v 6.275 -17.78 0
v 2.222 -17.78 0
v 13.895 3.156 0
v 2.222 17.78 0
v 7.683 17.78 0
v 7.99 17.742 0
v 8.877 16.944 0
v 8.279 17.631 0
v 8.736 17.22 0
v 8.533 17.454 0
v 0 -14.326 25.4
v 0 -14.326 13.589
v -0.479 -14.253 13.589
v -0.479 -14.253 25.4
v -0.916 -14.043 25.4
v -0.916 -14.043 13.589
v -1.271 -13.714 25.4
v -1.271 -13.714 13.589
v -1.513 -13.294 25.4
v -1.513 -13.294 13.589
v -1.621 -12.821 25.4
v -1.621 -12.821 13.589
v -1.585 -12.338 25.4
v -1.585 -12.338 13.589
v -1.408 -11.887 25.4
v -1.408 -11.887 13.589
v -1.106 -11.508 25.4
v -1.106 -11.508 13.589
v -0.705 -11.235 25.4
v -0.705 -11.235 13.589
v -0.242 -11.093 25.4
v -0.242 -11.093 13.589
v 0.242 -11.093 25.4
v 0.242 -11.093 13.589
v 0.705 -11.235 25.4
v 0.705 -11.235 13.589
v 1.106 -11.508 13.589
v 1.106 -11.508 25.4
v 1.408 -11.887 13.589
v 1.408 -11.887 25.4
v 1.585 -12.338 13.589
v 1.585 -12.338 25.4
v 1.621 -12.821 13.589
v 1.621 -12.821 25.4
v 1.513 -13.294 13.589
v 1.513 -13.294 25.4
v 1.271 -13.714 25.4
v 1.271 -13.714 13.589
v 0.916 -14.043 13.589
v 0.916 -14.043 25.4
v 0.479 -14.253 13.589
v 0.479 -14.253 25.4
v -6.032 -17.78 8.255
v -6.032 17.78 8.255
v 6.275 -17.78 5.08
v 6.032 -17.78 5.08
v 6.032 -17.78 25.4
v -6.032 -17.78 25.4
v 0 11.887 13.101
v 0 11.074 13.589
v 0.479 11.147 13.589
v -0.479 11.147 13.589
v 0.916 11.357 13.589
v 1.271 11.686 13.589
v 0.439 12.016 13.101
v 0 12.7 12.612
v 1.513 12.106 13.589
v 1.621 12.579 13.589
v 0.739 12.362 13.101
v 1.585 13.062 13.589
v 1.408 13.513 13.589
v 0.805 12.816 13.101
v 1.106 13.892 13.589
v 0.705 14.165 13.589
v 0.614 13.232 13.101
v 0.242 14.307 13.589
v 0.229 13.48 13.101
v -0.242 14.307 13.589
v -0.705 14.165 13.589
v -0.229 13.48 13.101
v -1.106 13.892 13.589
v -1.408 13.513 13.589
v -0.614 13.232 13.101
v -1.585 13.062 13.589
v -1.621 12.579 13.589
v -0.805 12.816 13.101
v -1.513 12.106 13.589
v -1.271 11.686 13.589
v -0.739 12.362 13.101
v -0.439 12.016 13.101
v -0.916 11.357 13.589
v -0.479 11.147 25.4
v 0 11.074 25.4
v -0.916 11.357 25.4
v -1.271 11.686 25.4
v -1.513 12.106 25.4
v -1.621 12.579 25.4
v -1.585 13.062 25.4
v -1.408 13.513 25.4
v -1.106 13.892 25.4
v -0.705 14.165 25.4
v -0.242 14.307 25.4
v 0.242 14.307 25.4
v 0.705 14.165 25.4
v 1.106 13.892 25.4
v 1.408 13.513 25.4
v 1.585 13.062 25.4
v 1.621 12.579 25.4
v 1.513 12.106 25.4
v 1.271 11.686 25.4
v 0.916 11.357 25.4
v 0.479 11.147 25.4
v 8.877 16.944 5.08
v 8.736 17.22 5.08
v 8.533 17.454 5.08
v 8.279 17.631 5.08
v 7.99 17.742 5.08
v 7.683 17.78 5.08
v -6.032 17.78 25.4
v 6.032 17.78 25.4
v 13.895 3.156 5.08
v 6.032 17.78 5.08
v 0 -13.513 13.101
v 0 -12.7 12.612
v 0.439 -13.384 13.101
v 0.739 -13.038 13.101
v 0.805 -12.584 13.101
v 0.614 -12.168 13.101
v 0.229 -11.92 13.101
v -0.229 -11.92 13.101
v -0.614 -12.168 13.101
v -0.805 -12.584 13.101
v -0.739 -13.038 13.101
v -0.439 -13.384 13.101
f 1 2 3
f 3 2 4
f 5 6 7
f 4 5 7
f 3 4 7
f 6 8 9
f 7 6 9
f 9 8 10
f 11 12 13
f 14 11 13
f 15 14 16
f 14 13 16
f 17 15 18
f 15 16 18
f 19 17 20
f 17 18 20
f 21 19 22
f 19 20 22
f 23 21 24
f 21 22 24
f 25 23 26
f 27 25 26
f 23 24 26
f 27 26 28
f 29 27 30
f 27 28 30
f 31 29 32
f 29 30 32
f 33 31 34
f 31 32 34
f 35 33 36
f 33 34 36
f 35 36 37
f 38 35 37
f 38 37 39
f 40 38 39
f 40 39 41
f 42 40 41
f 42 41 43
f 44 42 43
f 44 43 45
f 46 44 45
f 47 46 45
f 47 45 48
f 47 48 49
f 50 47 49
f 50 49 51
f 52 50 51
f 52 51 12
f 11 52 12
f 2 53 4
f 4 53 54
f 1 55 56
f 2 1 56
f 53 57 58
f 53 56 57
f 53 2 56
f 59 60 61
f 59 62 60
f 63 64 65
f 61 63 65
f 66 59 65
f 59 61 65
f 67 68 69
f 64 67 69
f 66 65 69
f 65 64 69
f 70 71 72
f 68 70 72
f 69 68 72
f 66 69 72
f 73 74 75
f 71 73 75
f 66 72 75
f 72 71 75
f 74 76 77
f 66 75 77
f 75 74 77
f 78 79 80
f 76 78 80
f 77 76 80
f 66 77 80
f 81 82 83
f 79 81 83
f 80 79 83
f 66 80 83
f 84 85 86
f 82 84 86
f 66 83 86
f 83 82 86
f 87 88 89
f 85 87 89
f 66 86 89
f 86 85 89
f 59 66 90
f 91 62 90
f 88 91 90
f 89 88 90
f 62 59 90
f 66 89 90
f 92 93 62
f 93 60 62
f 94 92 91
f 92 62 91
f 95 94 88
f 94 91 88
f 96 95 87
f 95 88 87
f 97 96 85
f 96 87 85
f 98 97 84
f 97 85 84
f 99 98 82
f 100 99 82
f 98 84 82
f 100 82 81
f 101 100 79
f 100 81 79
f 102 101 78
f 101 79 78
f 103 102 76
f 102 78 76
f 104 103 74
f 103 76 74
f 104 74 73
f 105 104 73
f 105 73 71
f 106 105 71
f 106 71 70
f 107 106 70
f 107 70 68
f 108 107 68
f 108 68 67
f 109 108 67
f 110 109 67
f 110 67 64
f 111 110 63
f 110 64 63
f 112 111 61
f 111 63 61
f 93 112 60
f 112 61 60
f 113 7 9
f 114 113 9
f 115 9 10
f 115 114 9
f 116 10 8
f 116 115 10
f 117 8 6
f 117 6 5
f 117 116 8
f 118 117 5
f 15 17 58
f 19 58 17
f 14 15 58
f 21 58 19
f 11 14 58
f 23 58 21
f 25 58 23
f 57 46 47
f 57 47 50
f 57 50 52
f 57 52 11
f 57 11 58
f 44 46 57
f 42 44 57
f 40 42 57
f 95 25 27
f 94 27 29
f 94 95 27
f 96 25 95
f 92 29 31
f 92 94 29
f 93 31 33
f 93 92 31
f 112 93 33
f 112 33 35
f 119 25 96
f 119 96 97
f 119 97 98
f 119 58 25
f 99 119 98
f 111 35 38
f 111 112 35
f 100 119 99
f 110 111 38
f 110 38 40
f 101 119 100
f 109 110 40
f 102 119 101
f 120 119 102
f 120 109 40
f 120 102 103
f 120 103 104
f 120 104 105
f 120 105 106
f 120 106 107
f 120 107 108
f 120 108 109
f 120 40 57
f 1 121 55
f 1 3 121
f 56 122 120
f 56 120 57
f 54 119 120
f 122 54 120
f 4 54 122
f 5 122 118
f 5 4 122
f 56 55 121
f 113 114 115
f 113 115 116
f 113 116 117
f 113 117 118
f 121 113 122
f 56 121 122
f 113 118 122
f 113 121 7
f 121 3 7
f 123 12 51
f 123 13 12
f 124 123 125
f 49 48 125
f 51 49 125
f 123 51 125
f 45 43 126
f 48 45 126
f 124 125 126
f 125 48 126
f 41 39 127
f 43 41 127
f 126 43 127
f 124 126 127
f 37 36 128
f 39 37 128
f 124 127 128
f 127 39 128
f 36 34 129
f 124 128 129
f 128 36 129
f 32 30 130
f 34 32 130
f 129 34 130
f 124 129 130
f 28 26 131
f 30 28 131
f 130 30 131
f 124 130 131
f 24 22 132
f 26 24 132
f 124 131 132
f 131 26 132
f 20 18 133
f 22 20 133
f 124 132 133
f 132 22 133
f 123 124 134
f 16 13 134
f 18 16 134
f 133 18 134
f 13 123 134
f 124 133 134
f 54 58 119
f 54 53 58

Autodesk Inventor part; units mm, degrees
ref_plane "YZ Plane" through (0, 0, 0) normal (1, 0, 0) x (0, 1, 0)
ref_plane "XZ Plane" through (0, 0, 0) normal (0, 1, 0) x (-1, 0, 0)
ref_plane "XY Plane" through (0, 0, 0) normal (0, 0, 1) x (1, 0, 0)
sketch "Sketch1" plane through (0, 0, 0) normal (0, 0, 1) x (1, 0, 0)
  line L0 (6.0325, -17.78) -> (-6.0325, -17.78)
  line L1 (-6.0325, -17.78) -> (-6.0325, 17.78)
  line L2 (-6.0325, 17.78) -> (6.0325, 17.78)
  line L3 (6.0325, 17.78) -> (6.0325, -17.78)
  line L4 (6.0325, -17.78) -> (-6.0325, 17.78) construction
  line L5 (-6.0325, -17.78) -> (6.0325, 17.78) construction
  point P0 (0, 0)
  dimension "d0" = 12.065
  dimension "d1" = 35.56
extrude "Extrusion1" add sketch "Sketch1" along normal blind 25.4
sketch "Sketch3" plane through (0, 0, 25.4) normal (0, 0, 1) x (1, 0, 0)
  line L0 (6.0325, -17.78) -> (6.0325, 17.78) projected
  line L1 (0, 26.67) -> (0, -26.67) projected
  line L2 (-8.4455, 0) -> (8.4455, 0) projected
  point P0 (0, 12.7)
  point P1 (0, -12.7)
  dimension "d45" = 12.7
  dimension "d46" = 12.7
  dimension "d47" = 0
hole "Hole5" at (0, 12.7, 25.4) at (0, -12.7, 25.4) direction (0, 0, -1) diameter 3.2512 depth 11.811 tip angle 118
sketch "Sketch7" plane through (0, 0, 0) normal (0, 0, -1) x (-1, 0, 0)
  line L0 (-6.0325, -17.78) -> (6.0325, -17.78) projected
  line L1 (6.0325, 17.78) -> (-6.0325, 17.78) projected
  line L2 (-6.0325, 17.78) -> (-6.0325, -17.78) projected
  line L3 (-15.0439, 0) -> (-8.5725, -17.78)
  line L4 (-6.0325, -17.78) -> (-8.5725, -17.78)
  line L5 (-15.0439, 0) -> (-8.5725, 17.78)
  line L6 (-8.5725, 17.78) -> (-6.0325, 17.78)
  line L7 (0, -26.67) -> (0, 26.67) projected
  line L8 (-19.0666, 0) -> (10.2157, 0) projected
  point P0 (0, 0)
  dimension "d70" = 70
  dimension "d71" = 70
  dimension "d72" = 2.54
extrude "Extrusion6" add sketch "Sketch7" against normal blind 5.08 contours L4 L3 L8 L2 | L8 L5 L6 L2
fillet "Fillet1" radius 3.175 1 edges at (15.0439, 0, 2.54)
fillet "Fillet2" radius 1.27 2 edges at (8.5725, -17.78, 2.54) (8.5725, 17.78, 2.54)
chamfer "Chamfer1" distance 8.255 angle 45 1 edges at (-6.0325, 0, 0)
sketch "Sketch8" plane through (0, 0, 0) normal (0, 0, -1) x (-1, 0, 0)
  line L0 (-2.2225, 17.78) -> (-2.2225, -17.78) projected
  line L1 (-2.2225, 17.78) -> (-7.6832, 17.78) projected
  arc A0 (-7.6832, 17.78) -> (-8.8766, 16.9444) centre (-7.6832, 16.51) ccw projected
  line L2 (-8.8766, 16.9444) -> (-14.6487, 1.0859) projected
  arc A1 (-14.6487, 1.0859) -> (-14.6487, -1.0859) centre (-11.6651, 0) ccw projected
  line L3 (-14.6487, -1.0859) -> (-8.8766, -16.9444) projected
  arc A2 (-8.8766, -16.9444) -> (-7.6832, -17.78) centre (-7.6832, -16.51) ccw projected
  line L4 (-7.6832, -17.78) -> (-2.2225, -17.78) projected
  line L5 (-14.6487, 1.0859) -> (-8.8766, 16.9444) projected
  line L6 (-13.8951, 3.1562) -> (-6.2749, -17.78)
  line L7 (-14.6487, -1.0859) -> (-8.8766, -16.9444) projected
  point P0 (0, 0)
  dimension "d80" = 2.159
extrude "Extrusion7" cut sketch "Sketch8" against normal up to next contours L4 A2 L3 A1 L2 L6
properties part number "J005413" material "ALUMINUM, 6061-T651"
